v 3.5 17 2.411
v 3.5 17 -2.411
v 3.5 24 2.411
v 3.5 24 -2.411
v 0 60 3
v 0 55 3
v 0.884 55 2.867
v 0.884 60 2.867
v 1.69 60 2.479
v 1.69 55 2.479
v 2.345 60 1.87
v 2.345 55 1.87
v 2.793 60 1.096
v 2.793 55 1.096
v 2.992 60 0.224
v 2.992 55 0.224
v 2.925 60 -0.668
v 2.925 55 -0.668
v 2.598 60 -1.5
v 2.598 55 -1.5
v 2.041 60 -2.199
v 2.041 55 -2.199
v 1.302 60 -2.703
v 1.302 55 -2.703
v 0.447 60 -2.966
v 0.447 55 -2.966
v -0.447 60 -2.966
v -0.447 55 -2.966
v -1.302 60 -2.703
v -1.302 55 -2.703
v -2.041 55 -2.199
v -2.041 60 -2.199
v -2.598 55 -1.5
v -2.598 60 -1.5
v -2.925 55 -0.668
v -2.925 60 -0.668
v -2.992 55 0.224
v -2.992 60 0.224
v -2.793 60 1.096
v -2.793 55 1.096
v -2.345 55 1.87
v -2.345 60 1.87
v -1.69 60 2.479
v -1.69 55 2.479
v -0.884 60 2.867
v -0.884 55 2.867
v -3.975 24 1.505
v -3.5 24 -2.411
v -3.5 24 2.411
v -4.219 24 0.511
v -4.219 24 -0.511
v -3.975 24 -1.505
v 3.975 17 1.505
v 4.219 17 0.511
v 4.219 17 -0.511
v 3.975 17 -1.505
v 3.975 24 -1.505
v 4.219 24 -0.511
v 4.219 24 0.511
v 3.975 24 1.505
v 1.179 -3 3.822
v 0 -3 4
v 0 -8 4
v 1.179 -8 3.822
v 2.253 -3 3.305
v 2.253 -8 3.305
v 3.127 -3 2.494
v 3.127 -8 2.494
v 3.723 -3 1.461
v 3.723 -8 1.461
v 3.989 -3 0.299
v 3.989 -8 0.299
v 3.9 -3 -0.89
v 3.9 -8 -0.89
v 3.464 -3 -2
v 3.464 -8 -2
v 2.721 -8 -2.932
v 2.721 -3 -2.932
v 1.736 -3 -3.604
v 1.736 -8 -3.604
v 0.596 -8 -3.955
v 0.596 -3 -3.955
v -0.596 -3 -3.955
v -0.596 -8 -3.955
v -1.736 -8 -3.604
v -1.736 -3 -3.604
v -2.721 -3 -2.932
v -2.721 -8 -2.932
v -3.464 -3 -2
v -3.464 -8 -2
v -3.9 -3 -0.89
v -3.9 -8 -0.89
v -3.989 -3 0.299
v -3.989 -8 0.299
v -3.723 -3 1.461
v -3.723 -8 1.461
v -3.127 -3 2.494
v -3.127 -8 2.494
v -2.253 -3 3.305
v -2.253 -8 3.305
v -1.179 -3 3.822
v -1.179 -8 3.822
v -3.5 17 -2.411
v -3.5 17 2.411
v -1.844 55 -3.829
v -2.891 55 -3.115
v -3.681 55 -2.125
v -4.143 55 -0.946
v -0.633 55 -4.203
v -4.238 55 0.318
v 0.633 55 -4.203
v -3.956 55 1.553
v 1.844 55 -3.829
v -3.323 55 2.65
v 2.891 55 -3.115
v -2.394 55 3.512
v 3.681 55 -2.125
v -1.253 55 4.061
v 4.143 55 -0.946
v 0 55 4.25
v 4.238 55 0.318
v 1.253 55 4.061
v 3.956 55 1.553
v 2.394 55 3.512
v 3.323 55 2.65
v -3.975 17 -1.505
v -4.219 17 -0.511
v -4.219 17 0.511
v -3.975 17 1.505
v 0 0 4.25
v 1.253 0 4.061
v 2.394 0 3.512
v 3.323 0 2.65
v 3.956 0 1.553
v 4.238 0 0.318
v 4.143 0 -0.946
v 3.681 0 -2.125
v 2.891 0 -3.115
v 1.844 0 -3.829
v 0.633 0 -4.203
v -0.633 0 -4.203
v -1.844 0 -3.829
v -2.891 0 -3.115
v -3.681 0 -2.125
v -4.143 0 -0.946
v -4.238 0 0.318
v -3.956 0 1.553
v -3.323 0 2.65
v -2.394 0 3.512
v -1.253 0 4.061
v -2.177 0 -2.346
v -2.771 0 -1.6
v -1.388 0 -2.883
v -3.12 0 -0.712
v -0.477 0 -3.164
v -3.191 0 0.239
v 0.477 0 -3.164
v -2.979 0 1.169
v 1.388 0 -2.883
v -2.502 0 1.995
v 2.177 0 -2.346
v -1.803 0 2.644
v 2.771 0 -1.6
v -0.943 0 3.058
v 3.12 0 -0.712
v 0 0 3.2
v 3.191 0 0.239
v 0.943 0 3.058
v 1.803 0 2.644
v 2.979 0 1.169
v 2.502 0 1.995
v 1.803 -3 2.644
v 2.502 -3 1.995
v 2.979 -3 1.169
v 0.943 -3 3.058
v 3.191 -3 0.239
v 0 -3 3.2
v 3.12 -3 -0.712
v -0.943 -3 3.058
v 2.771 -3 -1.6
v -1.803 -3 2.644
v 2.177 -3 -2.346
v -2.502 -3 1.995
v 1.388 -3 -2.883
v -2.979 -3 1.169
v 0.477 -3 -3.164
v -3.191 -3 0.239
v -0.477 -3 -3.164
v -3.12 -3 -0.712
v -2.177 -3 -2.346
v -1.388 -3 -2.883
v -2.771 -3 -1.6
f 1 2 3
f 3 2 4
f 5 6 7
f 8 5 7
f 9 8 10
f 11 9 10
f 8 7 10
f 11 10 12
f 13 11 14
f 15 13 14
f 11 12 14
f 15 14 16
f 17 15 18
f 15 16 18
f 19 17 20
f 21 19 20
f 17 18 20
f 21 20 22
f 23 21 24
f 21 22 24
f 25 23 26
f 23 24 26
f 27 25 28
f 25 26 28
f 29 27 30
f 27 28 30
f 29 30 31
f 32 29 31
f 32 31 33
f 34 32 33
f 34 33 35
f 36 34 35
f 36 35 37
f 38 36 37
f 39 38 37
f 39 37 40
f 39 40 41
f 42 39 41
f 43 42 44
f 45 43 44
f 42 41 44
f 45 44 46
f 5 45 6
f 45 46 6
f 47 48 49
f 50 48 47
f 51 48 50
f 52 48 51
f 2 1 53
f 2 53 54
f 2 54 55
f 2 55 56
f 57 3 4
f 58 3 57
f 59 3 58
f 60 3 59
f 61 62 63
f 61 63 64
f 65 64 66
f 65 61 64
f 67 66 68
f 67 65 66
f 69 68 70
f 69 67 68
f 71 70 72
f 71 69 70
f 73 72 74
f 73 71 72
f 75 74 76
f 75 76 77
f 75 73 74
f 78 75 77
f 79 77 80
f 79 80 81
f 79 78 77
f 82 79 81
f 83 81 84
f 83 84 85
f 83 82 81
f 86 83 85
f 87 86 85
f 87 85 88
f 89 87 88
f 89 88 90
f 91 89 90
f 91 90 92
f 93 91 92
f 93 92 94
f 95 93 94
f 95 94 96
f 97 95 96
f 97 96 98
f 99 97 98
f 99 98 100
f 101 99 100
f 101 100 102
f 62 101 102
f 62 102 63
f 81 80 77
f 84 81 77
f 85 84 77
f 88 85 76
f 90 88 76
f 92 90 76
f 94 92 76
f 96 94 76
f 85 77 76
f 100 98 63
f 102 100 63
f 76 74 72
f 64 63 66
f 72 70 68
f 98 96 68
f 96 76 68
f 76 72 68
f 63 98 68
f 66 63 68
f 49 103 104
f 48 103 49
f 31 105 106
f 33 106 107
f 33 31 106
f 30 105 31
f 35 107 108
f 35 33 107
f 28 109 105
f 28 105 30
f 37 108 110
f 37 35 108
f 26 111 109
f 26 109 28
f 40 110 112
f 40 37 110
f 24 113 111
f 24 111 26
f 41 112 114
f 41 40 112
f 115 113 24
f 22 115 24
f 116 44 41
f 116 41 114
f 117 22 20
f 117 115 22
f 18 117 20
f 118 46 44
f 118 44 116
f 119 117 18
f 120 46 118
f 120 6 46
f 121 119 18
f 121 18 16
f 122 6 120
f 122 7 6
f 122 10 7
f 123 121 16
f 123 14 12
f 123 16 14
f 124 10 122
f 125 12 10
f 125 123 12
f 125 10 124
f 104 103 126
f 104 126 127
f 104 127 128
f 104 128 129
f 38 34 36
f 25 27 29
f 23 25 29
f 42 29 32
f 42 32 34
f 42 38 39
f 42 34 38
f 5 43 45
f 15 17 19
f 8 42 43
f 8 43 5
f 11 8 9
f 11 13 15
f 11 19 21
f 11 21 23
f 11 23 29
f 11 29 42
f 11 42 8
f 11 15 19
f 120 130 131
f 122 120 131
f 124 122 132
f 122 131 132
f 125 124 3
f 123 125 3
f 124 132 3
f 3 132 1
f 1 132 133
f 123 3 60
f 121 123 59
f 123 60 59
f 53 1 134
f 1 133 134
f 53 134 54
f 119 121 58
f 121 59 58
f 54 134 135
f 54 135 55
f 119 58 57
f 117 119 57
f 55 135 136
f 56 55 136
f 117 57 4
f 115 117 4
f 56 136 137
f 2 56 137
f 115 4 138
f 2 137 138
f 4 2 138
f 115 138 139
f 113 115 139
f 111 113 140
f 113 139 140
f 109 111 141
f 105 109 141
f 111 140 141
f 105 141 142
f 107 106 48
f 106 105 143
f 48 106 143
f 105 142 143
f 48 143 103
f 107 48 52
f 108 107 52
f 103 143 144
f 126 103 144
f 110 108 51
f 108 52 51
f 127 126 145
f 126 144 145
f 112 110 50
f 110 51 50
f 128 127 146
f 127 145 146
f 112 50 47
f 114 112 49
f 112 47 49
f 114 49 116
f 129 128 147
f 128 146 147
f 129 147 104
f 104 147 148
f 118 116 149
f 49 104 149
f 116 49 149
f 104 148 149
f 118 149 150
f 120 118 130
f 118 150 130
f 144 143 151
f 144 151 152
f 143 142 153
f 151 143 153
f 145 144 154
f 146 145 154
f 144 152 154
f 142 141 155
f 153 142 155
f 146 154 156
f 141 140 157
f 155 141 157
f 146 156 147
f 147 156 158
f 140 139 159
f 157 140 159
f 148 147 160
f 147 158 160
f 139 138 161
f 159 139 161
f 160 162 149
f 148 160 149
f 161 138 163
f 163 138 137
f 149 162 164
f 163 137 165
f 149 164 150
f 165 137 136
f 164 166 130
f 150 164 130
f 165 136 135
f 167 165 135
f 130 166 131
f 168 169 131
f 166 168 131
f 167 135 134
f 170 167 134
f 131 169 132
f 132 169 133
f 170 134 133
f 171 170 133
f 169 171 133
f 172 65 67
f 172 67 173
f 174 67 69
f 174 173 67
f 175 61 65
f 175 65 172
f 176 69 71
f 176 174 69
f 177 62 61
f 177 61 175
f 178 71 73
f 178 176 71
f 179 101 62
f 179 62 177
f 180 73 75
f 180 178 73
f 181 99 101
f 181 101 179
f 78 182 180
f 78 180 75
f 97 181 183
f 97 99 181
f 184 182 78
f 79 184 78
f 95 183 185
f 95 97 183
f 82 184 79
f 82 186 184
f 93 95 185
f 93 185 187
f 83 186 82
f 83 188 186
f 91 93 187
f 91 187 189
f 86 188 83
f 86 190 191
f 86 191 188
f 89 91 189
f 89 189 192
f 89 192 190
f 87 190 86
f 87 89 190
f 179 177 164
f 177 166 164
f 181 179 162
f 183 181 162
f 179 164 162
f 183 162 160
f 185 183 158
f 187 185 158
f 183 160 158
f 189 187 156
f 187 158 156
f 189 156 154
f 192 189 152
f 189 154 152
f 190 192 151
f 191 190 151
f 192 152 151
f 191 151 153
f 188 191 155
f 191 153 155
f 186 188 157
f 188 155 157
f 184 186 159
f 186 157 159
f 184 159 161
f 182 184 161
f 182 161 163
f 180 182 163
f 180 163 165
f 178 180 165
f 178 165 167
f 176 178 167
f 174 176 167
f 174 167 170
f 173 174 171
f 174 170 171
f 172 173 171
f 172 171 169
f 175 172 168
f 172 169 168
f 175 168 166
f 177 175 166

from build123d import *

# Parameters (mm, degrees)
SKETCH1_R               = 4.25
BOSS_EXTRUDE1_DEPTH     = 55
SKETCH4_R               = 3
BOSS_EXTRUDE3_DEPTH     = 5
CUT_EXTRUDE2_DEPTH      = 10
CUT_EXTRUDE2_DEPTH_BACK = 10
SKETCH5_W               = 0.75
SKETCH5_H               = 7
SKETCH3_R               = 4
BOSS_EXTRUDE2_DEPTH     = 8
SKETCH6_W               = 0.8
SKETCH6_H               = 3


with BuildPart() as part:
    # Sketch1 → Boss-Extrude1 (new body)
    with BuildSketch(Plane(origin=(0, 0, 0), x_dir=(1, 0, 0), z_dir=(0, 1, 0))):
        Circle(SKETCH1_R)
    extrude(amount=BOSS_EXTRUDE1_DEPTH)

    # Sketch4 → Boss-Extrude3 (add)
    with BuildSketch(Plane(origin=(0, 55, 0), x_dir=(1, 0, 0), z_dir=(0, 1, 0))):
        Circle(SKETCH4_R)
    extrude(amount=BOSS_EXTRUDE3_DEPTH)

    # Sketch5 → Cut-Extrude2 (cut, two sides: drawn at the far end of the back side and taken through both)
    with BuildSketch(Plane.XY.offset(-CUT_EXTRUDE2_DEPTH_BACK)):
        with Locations((-3.875, 20.5)):
            Rectangle(SKETCH5_W, SKETCH5_H)
        with Locations((3.875, 20.5)):
            Rectangle(SKETCH5_W, SKETCH5_H)
    extrude(amount=CUT_EXTRUDE2_DEPTH + CUT_EXTRUDE2_DEPTH_BACK, mode=Mode.SUBTRACT)

    # Sketch3 → Boss-Extrude2 (add)
    with BuildSketch(Plane(origin=(0, 0, 0), x_dir=(1, 0, 0), z_dir=(0, 1, 0))):
        Circle(SKETCH3_R)
    extrude(amount=-BOSS_EXTRUDE2_DEPTH)

    # Sketch6 → Cut-Revolve1 (revolve, cut)
    with BuildSketch(Plane(origin=(0, 0, 0), x_dir=(0, 0, -1), z_dir=(1, 0, 0))):
        with Locations((3.6, -1.5)):
            Rectangle(SKETCH6_W, SKETCH6_H)
    revolve(axis=Axis((0, 55, 0), (0, -1, 0)), mode=Mode.SUBTRACT)


solid = part.part
